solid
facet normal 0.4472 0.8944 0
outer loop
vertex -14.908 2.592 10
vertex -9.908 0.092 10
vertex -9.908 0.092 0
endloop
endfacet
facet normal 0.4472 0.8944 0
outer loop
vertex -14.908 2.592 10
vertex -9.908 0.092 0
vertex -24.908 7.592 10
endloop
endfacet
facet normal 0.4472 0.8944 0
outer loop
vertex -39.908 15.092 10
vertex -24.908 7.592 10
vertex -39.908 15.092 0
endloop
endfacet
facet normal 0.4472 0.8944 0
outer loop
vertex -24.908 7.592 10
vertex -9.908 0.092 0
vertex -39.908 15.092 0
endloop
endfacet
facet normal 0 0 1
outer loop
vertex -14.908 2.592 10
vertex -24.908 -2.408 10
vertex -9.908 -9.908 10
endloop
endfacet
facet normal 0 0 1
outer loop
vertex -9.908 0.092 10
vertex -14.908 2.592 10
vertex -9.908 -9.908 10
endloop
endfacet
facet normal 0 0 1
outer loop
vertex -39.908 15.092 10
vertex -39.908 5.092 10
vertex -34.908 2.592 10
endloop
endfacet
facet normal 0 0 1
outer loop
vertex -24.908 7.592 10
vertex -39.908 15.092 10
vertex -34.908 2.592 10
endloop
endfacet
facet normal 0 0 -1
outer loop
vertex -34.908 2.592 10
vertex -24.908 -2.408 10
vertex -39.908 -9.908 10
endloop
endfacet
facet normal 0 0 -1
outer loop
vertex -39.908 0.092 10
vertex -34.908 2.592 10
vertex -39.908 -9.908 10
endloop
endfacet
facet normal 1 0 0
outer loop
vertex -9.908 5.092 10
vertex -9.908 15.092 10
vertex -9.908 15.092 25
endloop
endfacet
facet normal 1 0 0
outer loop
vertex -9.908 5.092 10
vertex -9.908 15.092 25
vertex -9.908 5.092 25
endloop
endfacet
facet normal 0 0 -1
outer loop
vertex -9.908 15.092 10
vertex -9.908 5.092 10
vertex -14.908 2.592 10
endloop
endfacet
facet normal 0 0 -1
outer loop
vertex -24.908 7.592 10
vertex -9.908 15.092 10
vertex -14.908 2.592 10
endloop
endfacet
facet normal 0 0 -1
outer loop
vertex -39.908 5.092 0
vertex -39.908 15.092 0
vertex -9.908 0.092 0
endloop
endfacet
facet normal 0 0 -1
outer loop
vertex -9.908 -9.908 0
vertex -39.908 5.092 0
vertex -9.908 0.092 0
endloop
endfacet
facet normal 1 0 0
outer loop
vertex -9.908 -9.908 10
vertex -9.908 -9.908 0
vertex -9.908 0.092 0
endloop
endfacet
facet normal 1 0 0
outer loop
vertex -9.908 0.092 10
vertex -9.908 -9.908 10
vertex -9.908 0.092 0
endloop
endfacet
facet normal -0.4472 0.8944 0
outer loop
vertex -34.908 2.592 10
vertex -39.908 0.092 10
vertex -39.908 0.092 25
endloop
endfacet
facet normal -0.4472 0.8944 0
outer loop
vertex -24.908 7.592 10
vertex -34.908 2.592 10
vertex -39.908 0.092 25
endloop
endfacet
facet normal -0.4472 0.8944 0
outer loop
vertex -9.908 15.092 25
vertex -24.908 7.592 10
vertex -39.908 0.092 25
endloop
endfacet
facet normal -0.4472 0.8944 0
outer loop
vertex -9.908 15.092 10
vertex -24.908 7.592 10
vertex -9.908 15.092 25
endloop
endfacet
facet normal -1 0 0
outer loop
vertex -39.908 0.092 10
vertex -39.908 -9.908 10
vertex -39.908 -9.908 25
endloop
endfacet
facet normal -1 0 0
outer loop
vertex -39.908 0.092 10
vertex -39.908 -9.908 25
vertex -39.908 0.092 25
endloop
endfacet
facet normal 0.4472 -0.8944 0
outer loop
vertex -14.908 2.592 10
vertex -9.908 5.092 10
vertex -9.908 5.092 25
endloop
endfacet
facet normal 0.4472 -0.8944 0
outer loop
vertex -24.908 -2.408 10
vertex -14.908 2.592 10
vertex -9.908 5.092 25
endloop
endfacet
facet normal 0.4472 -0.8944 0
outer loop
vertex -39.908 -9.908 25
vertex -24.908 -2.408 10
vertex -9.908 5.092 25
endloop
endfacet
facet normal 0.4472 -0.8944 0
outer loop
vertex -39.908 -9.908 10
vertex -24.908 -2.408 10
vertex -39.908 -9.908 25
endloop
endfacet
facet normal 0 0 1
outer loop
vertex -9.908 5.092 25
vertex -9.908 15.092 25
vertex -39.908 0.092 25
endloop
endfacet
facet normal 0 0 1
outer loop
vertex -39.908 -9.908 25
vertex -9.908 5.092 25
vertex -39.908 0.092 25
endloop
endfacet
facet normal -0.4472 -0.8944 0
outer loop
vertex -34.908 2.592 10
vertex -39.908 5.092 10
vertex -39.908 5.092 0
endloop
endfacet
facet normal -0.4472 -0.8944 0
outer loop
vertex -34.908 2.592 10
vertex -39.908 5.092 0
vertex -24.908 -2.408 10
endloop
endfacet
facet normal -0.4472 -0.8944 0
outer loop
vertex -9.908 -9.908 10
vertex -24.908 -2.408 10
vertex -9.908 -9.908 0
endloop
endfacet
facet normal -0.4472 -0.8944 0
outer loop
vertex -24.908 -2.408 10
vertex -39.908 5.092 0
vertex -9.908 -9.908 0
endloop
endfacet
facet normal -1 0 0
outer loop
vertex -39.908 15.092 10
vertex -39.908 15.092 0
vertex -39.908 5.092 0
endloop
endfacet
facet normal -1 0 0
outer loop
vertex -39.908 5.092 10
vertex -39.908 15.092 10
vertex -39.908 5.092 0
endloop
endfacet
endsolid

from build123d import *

# Parameters (mm, degrees)
BOSS_EXTRUDE1_DEPTH = 10
BOSS_EXTRUDE3_DEPTH = 15


with BuildPart() as part:
    # Sketch1 → Boss-Extrude1 (new body)
    with BuildSketch(Plane.XY):
        Polygon((-39.908256881, 15.091743119), (-39.908256881, 5.091743119), (-9.908256881, -9.908256881), (-9.908256881, 0.091743119), align=None)
    extrude(amount=BOSS_EXTRUDE1_DEPTH)

    # Sketch2 → Boss-Extrude3 (add)
    with BuildSketch(Plane.XY.offset(10)):
        Polygon((-9.908256881, 15.091743119), (-9.908256881, 5.091743119), (-39.908256881, -9.908256881), (-39.908256881, 0.091743119), align=None)
    extrude(amount=BOSS_EXTRUDE3_DEPTH)


solid = part.part
